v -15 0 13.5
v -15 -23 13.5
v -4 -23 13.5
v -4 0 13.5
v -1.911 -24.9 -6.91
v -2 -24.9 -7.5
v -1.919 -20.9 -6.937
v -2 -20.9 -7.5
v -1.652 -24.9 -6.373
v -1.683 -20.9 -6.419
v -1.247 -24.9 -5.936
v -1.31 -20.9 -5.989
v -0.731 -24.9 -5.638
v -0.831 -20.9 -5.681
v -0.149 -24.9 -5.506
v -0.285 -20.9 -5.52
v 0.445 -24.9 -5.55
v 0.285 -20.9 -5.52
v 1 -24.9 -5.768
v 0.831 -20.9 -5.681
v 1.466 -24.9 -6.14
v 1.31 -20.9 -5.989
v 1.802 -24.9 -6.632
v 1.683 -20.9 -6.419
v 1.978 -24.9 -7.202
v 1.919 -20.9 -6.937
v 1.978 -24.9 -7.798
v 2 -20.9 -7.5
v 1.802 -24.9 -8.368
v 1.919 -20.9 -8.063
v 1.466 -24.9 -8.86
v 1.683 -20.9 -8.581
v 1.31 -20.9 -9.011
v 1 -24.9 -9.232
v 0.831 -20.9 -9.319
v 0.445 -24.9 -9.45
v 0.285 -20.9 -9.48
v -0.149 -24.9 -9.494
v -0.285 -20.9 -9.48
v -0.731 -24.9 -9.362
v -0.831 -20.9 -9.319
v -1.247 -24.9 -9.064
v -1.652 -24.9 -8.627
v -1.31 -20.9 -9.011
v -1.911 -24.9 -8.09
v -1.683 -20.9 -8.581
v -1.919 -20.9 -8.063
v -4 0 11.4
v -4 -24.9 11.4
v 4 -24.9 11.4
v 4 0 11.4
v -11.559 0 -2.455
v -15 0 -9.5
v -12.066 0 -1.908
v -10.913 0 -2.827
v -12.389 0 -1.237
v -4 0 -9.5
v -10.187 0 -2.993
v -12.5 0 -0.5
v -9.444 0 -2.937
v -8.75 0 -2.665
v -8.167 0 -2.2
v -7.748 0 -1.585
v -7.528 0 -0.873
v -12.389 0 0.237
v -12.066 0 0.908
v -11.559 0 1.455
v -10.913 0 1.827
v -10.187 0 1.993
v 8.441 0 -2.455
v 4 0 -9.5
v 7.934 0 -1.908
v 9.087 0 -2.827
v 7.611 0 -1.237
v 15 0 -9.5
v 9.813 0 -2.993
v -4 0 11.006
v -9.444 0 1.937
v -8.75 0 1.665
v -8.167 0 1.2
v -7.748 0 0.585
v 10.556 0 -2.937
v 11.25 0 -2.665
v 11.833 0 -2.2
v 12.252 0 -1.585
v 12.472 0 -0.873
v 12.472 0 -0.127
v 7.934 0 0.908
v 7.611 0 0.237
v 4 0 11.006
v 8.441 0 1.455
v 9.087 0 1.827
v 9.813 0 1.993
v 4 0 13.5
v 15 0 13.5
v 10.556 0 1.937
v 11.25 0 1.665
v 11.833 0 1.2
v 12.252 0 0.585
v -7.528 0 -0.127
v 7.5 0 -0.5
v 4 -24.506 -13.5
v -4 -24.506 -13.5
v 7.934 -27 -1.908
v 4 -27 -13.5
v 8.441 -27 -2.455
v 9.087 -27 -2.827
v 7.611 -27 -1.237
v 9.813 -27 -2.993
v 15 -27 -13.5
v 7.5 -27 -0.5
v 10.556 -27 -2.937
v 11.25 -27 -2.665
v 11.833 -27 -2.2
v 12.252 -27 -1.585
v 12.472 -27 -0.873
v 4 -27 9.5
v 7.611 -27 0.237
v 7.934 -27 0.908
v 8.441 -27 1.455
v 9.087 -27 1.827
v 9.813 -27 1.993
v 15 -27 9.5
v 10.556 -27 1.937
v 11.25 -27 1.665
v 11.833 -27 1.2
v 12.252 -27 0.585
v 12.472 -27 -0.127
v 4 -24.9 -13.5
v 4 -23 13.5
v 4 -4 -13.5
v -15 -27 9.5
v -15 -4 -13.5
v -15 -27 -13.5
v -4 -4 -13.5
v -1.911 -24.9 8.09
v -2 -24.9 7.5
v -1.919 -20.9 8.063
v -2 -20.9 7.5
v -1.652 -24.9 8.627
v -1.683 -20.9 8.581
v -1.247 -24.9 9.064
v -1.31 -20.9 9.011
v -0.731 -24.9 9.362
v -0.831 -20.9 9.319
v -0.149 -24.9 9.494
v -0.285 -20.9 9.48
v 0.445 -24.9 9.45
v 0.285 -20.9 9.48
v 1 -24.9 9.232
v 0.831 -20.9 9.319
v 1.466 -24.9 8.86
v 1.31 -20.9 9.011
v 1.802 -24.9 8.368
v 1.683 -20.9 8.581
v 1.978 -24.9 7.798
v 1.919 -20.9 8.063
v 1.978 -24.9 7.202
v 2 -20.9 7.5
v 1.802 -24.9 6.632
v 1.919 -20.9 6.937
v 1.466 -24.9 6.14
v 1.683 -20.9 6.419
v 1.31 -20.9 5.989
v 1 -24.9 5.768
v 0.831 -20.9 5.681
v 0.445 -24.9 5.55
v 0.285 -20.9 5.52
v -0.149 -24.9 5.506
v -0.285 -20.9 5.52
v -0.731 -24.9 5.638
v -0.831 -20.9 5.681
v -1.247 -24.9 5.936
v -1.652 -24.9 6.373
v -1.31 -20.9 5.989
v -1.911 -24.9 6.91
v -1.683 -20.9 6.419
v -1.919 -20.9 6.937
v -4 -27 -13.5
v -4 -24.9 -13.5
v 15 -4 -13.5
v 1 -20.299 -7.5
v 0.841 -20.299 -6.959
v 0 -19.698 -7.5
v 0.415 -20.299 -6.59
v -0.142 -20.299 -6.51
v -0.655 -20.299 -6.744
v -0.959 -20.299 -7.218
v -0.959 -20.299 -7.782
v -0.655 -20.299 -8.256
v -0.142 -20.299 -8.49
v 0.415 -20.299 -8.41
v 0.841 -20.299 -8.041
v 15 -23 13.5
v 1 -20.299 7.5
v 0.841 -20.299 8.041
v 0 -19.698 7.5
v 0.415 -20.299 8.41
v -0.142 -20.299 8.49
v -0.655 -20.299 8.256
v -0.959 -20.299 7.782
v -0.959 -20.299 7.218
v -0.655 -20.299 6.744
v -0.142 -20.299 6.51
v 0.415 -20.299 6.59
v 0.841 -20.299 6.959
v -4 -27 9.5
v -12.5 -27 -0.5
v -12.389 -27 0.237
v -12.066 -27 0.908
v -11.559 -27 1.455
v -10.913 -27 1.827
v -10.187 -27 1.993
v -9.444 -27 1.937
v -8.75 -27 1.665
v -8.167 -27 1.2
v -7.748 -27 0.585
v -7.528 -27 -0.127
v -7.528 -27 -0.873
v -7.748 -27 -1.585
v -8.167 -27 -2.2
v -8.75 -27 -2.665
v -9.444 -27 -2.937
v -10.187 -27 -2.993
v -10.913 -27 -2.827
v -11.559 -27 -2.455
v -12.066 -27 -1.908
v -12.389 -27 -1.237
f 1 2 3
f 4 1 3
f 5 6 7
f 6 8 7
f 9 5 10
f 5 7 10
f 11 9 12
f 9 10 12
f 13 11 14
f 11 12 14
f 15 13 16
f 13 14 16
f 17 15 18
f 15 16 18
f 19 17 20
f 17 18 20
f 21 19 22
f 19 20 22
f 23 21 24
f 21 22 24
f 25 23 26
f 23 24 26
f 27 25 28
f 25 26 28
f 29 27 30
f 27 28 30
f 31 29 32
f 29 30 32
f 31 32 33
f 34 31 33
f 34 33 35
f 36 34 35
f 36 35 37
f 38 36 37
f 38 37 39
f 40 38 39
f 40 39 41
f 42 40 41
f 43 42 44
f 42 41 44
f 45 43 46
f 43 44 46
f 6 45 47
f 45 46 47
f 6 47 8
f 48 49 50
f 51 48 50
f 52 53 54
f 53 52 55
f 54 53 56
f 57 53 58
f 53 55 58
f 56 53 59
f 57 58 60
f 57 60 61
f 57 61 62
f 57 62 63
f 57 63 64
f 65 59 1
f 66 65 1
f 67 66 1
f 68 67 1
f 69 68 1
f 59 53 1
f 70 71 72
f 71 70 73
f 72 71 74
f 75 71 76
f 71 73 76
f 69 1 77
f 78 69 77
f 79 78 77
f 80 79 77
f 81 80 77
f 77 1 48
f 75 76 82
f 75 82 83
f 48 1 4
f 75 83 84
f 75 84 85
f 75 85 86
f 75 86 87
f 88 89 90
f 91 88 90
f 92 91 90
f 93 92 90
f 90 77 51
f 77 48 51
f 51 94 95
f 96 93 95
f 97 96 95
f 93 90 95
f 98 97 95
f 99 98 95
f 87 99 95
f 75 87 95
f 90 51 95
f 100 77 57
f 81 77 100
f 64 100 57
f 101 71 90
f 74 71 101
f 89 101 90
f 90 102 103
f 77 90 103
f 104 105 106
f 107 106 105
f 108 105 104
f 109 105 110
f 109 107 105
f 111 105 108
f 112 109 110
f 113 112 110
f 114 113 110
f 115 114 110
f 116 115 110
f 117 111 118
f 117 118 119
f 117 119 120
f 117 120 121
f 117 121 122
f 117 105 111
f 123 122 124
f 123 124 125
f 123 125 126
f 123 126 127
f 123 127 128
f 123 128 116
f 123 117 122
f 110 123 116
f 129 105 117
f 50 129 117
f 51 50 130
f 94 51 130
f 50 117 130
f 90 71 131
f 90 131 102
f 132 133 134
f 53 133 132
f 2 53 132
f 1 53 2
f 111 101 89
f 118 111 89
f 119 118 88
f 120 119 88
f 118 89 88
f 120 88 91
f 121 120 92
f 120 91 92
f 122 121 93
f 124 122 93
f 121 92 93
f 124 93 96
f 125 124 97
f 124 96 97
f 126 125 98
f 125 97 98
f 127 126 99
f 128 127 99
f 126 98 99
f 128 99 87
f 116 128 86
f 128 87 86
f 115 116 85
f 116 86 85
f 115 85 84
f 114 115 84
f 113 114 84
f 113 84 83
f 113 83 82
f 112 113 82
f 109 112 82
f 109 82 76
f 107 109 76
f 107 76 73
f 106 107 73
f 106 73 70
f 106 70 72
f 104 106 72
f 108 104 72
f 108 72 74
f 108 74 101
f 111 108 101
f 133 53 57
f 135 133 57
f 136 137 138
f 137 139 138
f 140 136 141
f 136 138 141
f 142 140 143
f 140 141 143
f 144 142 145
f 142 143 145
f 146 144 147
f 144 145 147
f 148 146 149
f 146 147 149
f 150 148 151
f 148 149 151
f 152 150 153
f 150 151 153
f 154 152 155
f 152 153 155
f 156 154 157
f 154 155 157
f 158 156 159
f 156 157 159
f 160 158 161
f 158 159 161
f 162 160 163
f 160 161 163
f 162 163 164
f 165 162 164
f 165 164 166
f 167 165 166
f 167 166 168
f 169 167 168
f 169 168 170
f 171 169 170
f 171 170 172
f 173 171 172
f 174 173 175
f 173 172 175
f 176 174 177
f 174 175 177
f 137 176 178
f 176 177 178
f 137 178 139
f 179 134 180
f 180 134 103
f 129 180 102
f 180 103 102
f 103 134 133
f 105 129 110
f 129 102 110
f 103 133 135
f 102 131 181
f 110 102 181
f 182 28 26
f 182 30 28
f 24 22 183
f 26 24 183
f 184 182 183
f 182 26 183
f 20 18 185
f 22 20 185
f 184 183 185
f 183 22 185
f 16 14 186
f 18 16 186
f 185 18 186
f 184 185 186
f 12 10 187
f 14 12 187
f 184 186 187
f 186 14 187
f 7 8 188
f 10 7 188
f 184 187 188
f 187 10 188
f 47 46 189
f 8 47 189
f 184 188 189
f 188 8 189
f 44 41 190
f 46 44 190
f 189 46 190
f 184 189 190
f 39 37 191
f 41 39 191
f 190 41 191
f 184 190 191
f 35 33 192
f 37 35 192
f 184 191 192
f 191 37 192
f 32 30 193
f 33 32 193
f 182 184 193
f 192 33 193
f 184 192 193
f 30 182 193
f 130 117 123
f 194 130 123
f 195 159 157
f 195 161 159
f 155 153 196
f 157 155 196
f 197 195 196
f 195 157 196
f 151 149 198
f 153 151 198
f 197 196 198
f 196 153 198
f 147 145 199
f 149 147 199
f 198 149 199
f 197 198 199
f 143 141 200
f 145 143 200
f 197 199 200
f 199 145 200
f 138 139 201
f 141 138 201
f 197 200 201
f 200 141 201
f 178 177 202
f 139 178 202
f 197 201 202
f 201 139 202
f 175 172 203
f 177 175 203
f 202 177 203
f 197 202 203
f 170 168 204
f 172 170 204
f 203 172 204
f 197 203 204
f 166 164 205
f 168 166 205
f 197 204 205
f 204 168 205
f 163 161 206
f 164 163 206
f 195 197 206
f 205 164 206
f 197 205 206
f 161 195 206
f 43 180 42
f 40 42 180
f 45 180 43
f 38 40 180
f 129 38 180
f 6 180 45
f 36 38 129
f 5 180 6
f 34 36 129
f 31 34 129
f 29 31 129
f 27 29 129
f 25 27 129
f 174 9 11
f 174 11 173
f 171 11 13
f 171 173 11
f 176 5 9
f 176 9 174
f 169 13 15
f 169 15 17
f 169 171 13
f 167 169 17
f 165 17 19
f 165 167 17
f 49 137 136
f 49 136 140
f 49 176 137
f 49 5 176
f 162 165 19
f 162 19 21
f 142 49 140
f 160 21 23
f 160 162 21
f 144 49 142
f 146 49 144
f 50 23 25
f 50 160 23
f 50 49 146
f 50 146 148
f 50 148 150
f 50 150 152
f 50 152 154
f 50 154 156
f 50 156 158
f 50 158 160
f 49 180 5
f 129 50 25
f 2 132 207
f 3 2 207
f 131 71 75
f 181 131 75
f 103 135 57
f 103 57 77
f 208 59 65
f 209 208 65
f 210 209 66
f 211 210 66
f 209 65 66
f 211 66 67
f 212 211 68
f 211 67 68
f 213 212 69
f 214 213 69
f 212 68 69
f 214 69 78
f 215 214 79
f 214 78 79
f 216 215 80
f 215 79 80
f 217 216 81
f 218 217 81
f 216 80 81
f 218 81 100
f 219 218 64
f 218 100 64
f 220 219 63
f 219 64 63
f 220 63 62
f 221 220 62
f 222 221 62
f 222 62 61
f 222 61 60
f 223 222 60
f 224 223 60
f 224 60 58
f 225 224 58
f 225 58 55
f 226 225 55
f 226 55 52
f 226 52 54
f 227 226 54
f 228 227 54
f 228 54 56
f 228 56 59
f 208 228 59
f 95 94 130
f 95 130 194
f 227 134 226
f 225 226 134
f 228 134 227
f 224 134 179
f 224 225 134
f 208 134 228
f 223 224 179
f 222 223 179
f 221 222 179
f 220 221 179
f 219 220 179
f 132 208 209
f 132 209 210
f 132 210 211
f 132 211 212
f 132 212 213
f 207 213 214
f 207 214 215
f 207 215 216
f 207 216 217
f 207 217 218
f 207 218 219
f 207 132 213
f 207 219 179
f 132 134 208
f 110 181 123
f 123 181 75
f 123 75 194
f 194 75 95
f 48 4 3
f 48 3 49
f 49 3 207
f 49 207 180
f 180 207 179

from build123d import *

# Parameters (mm, degrees)
F0_W      = 30
F0_H      = 27
F1_DEPTH  = 27
F2_SIZE   = 4
F4_D      = 5
F5_W      = 8
F5_H      = 23
F5_H_2    = 4
F6_DEPTH  = 2.1
F7_W      = 8
F7_H      = 28.8321655244
F7_H_2    = 23
F7_H_3    = 5.8321655244
F8_DEPTH  = 2.1
F9_W      = 8
F9_H      = 33.7052789075
F9_H_2    = 5.6568542495
F9_H_3    = 30.637866843
F10_DEPTH = 14.5
F12_D     = 4
F12_DEPTH = 4
F12_TIP   = 1.2017212381


with BuildPart() as f1:
    # F0 (on Front) → F1 (new body)
    with BuildSketch(Plane.XZ):
        Rectangle(F0_W, F0_H)
    extrude(amount=F1_DEPTH)

    # F2
    f2_edges = [f1.edges().sort_by_distance(p)[0] for p in [
        (0, 0, -13.5),
        (0, -27, 13.5),
    ]]
    chamfer(f2_edges, length=F2_SIZE)

    # F4 (through all)
    with Locations(Plane.XZ.offset(27)):
        with Locations((-10, -0.5), (10, -0.5)):
            Hole(F4_D / 2)

    # F5 (on face) → F6 (cut)
    with BuildSketch(Plane.XZ.offset(27)):
        with Locations((0, -2)):
            Rectangle(F5_W, F5_H)
        with Locations((0, 11.5)):
            Rectangle(F5_W, F5_H_2)
    extrude(amount=-F6_DEPTH, mode=Mode.SUBTRACT)

    # F7 (on face) → F8 (cut)
    with BuildSketch(Plane.XY.offset(13.5)):
        with Locations((0, 14.4160827622)):
            Rectangle(F7_W, F7_H)
        with Locations((0, -11.5)):
            Rectangle(F7_W, F7_H_2)
        with Locations((0, -25.9160827622)):
            Rectangle(F7_W, F7_H_3)
    extrude(amount=-F8_DEPTH, mode=Mode.SUBTRACT)

    # F9 (on face) → F10 (cut)
    with BuildSketch(Plane(origin=(0, 4.75, -4.75), x_dir=(-1, 0, 0), z_dir=(0, 0.7071067812, -0.7071067812))):
        with Locations((0, -29.2270081245)):
            Rectangle(F9_W, F9_H)
        with Locations((0, -9.545941546)):
            Rectangle(F9_W, F9_H_2)
        with Locations((0, 8.6014190002)):
            Rectangle(F9_W, F9_H_3)
    extrude(amount=-F10_DEPTH, mode=Mode.SUBTRACT)

    # F12
    with Locations(Plane.XZ.offset(24.9)):
        with Locations((0, -7.5), (0, 7.5)):
            Hole(F12_D / 2, depth=F12_DEPTH)
            with Locations((0, 0, -(F12_DEPTH + F12_TIP / 2))):  # 118° drill point
                Cone(0, F12_D / 2, F12_TIP, mode=Mode.SUBTRACT)


solid = f1.part
